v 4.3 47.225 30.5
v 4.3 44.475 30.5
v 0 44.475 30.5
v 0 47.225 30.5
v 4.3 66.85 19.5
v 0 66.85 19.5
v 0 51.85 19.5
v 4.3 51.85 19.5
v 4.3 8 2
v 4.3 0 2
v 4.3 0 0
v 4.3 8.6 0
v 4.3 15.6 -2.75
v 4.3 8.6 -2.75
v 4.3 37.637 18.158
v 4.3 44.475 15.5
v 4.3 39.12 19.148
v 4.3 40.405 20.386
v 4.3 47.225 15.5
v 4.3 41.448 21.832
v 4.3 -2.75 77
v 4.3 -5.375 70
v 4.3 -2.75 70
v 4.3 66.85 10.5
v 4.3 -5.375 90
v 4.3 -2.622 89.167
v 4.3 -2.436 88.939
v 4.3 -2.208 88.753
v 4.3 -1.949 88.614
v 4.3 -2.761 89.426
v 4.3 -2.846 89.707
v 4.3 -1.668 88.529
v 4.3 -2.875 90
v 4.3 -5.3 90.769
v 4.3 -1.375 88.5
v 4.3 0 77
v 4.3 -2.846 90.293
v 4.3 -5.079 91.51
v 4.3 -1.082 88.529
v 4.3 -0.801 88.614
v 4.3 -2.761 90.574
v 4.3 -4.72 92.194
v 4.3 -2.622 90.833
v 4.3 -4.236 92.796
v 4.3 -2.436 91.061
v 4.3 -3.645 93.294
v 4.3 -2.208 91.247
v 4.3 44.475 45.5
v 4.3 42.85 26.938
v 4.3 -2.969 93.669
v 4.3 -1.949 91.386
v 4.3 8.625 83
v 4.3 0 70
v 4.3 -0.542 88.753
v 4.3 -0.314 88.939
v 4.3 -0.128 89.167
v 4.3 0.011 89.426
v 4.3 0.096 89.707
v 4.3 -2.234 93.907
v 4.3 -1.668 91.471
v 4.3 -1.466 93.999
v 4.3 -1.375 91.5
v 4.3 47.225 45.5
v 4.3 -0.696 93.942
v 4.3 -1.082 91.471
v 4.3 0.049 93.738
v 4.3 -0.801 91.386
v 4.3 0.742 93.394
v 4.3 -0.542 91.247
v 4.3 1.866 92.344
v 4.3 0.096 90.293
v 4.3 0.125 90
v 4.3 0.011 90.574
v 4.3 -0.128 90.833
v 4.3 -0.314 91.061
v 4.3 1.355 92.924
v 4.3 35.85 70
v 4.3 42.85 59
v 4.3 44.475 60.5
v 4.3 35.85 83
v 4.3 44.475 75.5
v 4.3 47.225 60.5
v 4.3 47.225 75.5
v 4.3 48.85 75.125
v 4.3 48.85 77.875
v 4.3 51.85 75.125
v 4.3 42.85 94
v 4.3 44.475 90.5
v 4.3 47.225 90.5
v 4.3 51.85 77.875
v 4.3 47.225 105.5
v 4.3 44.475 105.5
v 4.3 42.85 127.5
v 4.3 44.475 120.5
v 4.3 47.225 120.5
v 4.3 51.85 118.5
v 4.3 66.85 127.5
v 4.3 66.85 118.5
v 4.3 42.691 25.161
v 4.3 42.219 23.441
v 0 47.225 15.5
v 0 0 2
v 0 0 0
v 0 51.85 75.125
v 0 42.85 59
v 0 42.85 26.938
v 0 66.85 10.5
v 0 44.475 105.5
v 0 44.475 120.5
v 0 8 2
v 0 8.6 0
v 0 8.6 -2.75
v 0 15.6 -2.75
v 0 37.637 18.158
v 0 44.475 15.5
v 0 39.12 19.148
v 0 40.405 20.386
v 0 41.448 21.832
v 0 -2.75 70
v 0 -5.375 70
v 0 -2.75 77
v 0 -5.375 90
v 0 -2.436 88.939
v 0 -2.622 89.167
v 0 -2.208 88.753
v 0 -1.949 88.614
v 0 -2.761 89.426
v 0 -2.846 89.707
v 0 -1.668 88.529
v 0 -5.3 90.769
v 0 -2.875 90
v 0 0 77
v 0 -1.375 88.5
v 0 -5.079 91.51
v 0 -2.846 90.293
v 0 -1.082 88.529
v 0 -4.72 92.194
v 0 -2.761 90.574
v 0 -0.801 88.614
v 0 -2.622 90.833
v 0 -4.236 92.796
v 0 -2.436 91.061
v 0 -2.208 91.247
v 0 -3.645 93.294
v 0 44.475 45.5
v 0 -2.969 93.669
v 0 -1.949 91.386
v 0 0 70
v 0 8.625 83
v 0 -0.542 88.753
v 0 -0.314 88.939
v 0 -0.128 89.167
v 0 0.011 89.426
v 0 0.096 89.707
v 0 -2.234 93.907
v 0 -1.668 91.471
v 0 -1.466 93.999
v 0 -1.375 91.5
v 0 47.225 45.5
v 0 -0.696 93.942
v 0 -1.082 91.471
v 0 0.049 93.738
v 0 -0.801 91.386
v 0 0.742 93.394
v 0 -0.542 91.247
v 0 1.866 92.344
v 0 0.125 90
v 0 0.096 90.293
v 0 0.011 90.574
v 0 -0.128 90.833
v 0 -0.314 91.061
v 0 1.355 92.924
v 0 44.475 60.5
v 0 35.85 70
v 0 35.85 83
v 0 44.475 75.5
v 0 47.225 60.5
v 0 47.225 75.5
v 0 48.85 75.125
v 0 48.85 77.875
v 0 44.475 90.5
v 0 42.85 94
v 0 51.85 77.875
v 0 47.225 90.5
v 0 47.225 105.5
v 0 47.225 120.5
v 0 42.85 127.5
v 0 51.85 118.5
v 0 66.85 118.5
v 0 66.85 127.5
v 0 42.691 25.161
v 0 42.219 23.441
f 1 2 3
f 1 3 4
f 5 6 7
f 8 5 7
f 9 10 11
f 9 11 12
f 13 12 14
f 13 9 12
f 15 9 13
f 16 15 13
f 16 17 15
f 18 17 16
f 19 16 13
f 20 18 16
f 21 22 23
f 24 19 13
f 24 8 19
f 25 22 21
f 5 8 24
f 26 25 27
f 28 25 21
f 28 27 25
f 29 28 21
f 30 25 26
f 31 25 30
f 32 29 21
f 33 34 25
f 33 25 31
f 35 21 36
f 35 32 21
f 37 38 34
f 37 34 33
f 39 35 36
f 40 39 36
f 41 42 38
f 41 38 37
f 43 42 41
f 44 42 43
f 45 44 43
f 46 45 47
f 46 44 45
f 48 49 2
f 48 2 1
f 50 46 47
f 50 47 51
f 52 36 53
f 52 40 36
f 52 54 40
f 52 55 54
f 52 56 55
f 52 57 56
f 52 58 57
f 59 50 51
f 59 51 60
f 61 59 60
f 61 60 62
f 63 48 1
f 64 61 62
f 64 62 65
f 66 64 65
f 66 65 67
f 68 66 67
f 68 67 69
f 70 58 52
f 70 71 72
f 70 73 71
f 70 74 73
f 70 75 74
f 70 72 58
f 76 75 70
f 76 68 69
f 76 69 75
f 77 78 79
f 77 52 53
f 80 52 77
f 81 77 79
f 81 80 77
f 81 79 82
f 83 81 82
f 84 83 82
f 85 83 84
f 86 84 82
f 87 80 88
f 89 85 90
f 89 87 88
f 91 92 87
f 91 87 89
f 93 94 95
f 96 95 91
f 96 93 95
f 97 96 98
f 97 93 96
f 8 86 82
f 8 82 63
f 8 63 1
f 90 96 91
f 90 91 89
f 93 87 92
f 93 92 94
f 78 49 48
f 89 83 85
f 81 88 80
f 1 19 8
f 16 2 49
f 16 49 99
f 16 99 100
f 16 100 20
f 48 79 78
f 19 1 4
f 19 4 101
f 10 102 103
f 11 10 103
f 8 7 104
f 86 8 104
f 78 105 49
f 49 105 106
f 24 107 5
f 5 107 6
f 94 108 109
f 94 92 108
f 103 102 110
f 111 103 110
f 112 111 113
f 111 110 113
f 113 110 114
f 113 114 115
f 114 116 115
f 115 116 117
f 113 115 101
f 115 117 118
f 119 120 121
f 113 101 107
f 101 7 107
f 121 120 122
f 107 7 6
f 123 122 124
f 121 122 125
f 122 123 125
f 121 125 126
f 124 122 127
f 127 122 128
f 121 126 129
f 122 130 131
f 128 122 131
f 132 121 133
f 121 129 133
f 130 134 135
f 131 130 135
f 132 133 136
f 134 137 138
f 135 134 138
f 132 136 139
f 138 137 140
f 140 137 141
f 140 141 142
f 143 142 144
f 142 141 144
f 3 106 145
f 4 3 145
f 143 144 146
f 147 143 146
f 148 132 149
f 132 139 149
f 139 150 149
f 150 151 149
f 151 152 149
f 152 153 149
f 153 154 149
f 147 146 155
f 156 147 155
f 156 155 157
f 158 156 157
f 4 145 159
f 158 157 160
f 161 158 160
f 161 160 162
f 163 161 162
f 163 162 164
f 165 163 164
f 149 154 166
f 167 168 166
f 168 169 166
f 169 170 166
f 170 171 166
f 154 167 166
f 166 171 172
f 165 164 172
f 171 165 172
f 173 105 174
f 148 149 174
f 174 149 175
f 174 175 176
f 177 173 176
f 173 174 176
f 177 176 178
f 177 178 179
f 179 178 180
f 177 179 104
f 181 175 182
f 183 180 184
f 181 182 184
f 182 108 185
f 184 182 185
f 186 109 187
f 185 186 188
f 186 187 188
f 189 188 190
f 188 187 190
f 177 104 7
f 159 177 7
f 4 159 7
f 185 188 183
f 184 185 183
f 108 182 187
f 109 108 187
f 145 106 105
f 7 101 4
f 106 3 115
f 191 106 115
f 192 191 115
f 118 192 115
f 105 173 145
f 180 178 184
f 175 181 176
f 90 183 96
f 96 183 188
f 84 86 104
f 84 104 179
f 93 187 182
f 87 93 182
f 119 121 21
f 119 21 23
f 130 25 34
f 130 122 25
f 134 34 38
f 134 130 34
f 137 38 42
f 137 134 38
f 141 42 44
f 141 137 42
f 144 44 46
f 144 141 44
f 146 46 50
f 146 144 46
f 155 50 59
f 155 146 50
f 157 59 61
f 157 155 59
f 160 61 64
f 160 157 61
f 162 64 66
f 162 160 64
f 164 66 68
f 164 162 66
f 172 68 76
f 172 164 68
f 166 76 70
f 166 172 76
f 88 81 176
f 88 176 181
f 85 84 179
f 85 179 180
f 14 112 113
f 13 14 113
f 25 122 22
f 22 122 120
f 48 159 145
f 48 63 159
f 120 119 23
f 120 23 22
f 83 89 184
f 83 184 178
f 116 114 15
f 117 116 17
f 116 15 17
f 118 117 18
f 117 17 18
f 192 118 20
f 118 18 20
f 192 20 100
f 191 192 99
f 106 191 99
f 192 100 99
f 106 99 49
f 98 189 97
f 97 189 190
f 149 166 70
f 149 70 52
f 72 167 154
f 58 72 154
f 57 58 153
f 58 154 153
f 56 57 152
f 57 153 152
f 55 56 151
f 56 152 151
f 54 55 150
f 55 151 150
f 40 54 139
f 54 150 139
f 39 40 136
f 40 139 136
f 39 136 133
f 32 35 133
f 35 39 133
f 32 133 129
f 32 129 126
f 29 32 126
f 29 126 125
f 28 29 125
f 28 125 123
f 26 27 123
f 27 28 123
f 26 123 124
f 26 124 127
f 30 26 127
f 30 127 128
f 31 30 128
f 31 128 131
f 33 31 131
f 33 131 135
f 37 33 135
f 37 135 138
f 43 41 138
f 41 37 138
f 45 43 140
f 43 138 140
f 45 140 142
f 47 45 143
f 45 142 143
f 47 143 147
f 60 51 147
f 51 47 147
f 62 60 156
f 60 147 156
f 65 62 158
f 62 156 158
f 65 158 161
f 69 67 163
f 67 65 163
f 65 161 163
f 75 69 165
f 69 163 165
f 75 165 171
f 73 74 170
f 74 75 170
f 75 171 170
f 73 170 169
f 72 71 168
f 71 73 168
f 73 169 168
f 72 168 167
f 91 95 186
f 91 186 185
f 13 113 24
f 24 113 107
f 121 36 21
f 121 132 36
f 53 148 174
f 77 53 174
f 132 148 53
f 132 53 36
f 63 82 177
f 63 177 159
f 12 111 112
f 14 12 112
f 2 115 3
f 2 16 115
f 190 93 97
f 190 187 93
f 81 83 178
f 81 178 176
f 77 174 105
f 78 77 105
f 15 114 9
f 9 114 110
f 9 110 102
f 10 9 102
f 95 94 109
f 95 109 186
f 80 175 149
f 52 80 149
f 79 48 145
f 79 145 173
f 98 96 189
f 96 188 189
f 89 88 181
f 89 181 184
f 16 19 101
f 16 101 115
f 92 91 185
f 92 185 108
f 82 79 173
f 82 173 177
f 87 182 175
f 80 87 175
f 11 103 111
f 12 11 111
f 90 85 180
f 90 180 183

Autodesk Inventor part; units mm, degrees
ref_plane "YZ Plane" through (0, 0, 0) normal (1, 0, 0) x (0, 1, 0)
ref_plane "XZ Plane" through (0, 0, 0) normal (0, 1, 0) x (-1, 0, 0)
ref_plane "XY Plane" through (0, 0, 0) normal (0, 0, 1) x (1, 0, 0)
sketch "Sketch1" plane through (0, 0, 0) normal (1, 0, 0) x (0, 1, 0)
  line L0 (0, 0) -> (8.6, 0)
  line L1 (8.6, 0) -> (8.6, -2.75)
  line L2 (8.6, -2.75) -> (15.6, -2.75)
  line L3 (15.6, -2.75) -> (66.85, 10.5)
  line L4 (66.85, 10.5) -> (66.85, 19.5)
  line L5 (66.85, 19.5) -> (51.85, 19.5)
  line L6 (51.85, 19.5) -> (51.85, 118.5)
  line L7 (51.85, 118.5) -> (66.85, 118.5)
  line L8 (66.85, 118.5) -> (66.85, 127.5)
  line L9 (42.85, 21) -> (8, 2)
  line L10 (8, 2) -> (0, 2)
  line L11 (0, 2) -> (0, 0)
  line L12 (0, 70) -> (0, 77)
  line L13 (0, 77) -> (-2.75, 77)
  line L14 (-2.75, 77) -> (-2.75, 70)
  line L15 (0, 70) -> (35.85, 70)
  line L16 (35.85, 70) -> (42.85, 59)
  line L17 (42.85, 94) -> (35.85, 83)
  line L18 (35.85, 83) -> (35.85, 70) construction
  line L19 (42.85, 127.5) -> (42.85, 94)
  line L20 (42.85, 59) -> (42.85, 21)
  line L21 (42.85, 127.5) -> (66.85, 127.5)
  line L22 (-1.375, 77) -> (-1.375, 90) construction
  arc A0 (1.866, 92.3443) -> (-5.375, 90) centre (-1.375, 90) ccw
  line L23 (-5.375, 90) -> (-5.375, 70)
  line L24 (1.866, 92.3443) -> (8.625, 83)
  circle A1 centre (-1.375, 90) radius 1.5
  line L25 (35.85, 83) -> (8.625, 83)
  line L26 (-2.75, 70) -> (-5.375, 70)
  dimension "d0" = 2.75
  dimension "d1" = 8.6
  dimension "d2" = 7
  dimension "d3" = 2
  dimension "d4" = 43.25
  dimension "d6" = 15
  dimension "d7" = 99
  dimension "d8" = 9
  dimension "d14" = 19.5
  dimension "d16" = 8
  dimension "d25" = 9
  dimension "d27" = 2.75
  dimension "d29" = 8.6
  dimension "d34" = 7
  dimension "d36" = 9
  dimension "d37" = 9
  dimension "d38" = 7
  dimension "d39" = 35
  dimension "d56" = 8
  dimension "d57" = 3
  dimension "d59" = 10
  dimension "d61" = 38
  dimension "d77" = 13
  dimension "d78" = 75
  dimension "d79" = 13
  dimension "d81" = 2.625
extrude "Extrusion1" add sketch "Sketch1" along normal blind 4.3
sketch "Sketch2" plane through (4.3, 0, 0) normal (1, 0, 0) x (0, 0, -1)
  line L0 (-120.5, 47.225) -> (-105.5, 47.225)
  line L1 (-105.5, 47.225) -> (-105.5, 44.475)
  line L2 (-105.5, 44.475) -> (-120.5, 44.475)
  line L3 (-120.5, 44.475) -> (-120.5, 47.225)
  line L4 (-90.5, 47.225) -> (-75.5, 47.225)
  line L5 (-75.5, 47.225) -> (-75.5, 44.475)
  line L6 (-75.5, 44.475) -> (-90.5, 44.475)
  line L7 (-90.5, 44.475) -> (-90.5, 47.225)
  line L8 (-60.5, 47.225) -> (-45.5, 47.225)
  line L9 (-45.5, 47.225) -> (-45.5, 44.475)
  line L10 (-45.5, 44.475) -> (-60.5, 44.475)
  line L11 (-60.5, 44.475) -> (-60.5, 47.225)
  line L12 (-30.5, 47.225) -> (-15.5, 47.225)
  line L13 (-15.5, 47.225) -> (-15.5, 44.475)
  line L14 (-15.5, 44.475) -> (-30.5, 44.475)
  line L15 (-30.5, 44.475) -> (-30.5, 47.225)
  line L16 (-127.5, 66.85) -> (-127.5, 42.85) projected
  line L17 (-19.5, 51.85) -> (-118.5, 51.85) projected
  line L18 (-127.5, 42.85) -> (-94, 42.85) projected
  line L19 (-105.5, 45.85) -> (-104.169, 45.85) construction
  line L20 (-104.169, 45.85) -> (-104.169, 42.85) construction
  line L21 (-127.5, 42.85) -> (-94, 42.85) projected
  point P0 (0, 0)
  dimension "d43" = 7
  dimension "d44" = 2.75
  dimension "d46" = 15
  dimension "d47" = 30
  dimension "d48" = 30
  dimension "d49" = 15
  dimension "d50" = 15
  dimension "d51" = 15
  dimension "d52" = 30
  dimension "d72" = 3
extrude "Extrusion2" cut sketch "Sketch2" against normal blind 10
fillet "Fillet1" radius 10 1 edges at (2.15, 42.85, 21)
sketch "Sketch4" plane through (4.3, 0, 0) normal (1, 0, 0) x (0, 0, -1)
  line L0 (-19.5, 51.85) -> (-118.5, 51.85) projected
  line L1 (-77.875, 51.85) -> (-75.125, 51.85)
  line L2 (-75.125, 51.85) -> (-75.125, 48.85)
  line L3 (-75.125, 48.85) -> (-77.875, 48.85)
  line L4 (-77.875, 48.85) -> (-77.875, 51.85)
  line L5 (-90.5, 47.225) -> (-75.5, 47.225) projected
  line L6 (-77, -2.75) -> (-77, 0) projected
  point P0 (0, 0)
  dimension "d73" = 3
  dimension "d74" = 1.625
  dimension "d82" = 0.875
  dimension "d83" = 2.75
extrude "Extrusion4" cut sketch "Sketch4" against normal blind 10
properties part number "TrayPanelG"
